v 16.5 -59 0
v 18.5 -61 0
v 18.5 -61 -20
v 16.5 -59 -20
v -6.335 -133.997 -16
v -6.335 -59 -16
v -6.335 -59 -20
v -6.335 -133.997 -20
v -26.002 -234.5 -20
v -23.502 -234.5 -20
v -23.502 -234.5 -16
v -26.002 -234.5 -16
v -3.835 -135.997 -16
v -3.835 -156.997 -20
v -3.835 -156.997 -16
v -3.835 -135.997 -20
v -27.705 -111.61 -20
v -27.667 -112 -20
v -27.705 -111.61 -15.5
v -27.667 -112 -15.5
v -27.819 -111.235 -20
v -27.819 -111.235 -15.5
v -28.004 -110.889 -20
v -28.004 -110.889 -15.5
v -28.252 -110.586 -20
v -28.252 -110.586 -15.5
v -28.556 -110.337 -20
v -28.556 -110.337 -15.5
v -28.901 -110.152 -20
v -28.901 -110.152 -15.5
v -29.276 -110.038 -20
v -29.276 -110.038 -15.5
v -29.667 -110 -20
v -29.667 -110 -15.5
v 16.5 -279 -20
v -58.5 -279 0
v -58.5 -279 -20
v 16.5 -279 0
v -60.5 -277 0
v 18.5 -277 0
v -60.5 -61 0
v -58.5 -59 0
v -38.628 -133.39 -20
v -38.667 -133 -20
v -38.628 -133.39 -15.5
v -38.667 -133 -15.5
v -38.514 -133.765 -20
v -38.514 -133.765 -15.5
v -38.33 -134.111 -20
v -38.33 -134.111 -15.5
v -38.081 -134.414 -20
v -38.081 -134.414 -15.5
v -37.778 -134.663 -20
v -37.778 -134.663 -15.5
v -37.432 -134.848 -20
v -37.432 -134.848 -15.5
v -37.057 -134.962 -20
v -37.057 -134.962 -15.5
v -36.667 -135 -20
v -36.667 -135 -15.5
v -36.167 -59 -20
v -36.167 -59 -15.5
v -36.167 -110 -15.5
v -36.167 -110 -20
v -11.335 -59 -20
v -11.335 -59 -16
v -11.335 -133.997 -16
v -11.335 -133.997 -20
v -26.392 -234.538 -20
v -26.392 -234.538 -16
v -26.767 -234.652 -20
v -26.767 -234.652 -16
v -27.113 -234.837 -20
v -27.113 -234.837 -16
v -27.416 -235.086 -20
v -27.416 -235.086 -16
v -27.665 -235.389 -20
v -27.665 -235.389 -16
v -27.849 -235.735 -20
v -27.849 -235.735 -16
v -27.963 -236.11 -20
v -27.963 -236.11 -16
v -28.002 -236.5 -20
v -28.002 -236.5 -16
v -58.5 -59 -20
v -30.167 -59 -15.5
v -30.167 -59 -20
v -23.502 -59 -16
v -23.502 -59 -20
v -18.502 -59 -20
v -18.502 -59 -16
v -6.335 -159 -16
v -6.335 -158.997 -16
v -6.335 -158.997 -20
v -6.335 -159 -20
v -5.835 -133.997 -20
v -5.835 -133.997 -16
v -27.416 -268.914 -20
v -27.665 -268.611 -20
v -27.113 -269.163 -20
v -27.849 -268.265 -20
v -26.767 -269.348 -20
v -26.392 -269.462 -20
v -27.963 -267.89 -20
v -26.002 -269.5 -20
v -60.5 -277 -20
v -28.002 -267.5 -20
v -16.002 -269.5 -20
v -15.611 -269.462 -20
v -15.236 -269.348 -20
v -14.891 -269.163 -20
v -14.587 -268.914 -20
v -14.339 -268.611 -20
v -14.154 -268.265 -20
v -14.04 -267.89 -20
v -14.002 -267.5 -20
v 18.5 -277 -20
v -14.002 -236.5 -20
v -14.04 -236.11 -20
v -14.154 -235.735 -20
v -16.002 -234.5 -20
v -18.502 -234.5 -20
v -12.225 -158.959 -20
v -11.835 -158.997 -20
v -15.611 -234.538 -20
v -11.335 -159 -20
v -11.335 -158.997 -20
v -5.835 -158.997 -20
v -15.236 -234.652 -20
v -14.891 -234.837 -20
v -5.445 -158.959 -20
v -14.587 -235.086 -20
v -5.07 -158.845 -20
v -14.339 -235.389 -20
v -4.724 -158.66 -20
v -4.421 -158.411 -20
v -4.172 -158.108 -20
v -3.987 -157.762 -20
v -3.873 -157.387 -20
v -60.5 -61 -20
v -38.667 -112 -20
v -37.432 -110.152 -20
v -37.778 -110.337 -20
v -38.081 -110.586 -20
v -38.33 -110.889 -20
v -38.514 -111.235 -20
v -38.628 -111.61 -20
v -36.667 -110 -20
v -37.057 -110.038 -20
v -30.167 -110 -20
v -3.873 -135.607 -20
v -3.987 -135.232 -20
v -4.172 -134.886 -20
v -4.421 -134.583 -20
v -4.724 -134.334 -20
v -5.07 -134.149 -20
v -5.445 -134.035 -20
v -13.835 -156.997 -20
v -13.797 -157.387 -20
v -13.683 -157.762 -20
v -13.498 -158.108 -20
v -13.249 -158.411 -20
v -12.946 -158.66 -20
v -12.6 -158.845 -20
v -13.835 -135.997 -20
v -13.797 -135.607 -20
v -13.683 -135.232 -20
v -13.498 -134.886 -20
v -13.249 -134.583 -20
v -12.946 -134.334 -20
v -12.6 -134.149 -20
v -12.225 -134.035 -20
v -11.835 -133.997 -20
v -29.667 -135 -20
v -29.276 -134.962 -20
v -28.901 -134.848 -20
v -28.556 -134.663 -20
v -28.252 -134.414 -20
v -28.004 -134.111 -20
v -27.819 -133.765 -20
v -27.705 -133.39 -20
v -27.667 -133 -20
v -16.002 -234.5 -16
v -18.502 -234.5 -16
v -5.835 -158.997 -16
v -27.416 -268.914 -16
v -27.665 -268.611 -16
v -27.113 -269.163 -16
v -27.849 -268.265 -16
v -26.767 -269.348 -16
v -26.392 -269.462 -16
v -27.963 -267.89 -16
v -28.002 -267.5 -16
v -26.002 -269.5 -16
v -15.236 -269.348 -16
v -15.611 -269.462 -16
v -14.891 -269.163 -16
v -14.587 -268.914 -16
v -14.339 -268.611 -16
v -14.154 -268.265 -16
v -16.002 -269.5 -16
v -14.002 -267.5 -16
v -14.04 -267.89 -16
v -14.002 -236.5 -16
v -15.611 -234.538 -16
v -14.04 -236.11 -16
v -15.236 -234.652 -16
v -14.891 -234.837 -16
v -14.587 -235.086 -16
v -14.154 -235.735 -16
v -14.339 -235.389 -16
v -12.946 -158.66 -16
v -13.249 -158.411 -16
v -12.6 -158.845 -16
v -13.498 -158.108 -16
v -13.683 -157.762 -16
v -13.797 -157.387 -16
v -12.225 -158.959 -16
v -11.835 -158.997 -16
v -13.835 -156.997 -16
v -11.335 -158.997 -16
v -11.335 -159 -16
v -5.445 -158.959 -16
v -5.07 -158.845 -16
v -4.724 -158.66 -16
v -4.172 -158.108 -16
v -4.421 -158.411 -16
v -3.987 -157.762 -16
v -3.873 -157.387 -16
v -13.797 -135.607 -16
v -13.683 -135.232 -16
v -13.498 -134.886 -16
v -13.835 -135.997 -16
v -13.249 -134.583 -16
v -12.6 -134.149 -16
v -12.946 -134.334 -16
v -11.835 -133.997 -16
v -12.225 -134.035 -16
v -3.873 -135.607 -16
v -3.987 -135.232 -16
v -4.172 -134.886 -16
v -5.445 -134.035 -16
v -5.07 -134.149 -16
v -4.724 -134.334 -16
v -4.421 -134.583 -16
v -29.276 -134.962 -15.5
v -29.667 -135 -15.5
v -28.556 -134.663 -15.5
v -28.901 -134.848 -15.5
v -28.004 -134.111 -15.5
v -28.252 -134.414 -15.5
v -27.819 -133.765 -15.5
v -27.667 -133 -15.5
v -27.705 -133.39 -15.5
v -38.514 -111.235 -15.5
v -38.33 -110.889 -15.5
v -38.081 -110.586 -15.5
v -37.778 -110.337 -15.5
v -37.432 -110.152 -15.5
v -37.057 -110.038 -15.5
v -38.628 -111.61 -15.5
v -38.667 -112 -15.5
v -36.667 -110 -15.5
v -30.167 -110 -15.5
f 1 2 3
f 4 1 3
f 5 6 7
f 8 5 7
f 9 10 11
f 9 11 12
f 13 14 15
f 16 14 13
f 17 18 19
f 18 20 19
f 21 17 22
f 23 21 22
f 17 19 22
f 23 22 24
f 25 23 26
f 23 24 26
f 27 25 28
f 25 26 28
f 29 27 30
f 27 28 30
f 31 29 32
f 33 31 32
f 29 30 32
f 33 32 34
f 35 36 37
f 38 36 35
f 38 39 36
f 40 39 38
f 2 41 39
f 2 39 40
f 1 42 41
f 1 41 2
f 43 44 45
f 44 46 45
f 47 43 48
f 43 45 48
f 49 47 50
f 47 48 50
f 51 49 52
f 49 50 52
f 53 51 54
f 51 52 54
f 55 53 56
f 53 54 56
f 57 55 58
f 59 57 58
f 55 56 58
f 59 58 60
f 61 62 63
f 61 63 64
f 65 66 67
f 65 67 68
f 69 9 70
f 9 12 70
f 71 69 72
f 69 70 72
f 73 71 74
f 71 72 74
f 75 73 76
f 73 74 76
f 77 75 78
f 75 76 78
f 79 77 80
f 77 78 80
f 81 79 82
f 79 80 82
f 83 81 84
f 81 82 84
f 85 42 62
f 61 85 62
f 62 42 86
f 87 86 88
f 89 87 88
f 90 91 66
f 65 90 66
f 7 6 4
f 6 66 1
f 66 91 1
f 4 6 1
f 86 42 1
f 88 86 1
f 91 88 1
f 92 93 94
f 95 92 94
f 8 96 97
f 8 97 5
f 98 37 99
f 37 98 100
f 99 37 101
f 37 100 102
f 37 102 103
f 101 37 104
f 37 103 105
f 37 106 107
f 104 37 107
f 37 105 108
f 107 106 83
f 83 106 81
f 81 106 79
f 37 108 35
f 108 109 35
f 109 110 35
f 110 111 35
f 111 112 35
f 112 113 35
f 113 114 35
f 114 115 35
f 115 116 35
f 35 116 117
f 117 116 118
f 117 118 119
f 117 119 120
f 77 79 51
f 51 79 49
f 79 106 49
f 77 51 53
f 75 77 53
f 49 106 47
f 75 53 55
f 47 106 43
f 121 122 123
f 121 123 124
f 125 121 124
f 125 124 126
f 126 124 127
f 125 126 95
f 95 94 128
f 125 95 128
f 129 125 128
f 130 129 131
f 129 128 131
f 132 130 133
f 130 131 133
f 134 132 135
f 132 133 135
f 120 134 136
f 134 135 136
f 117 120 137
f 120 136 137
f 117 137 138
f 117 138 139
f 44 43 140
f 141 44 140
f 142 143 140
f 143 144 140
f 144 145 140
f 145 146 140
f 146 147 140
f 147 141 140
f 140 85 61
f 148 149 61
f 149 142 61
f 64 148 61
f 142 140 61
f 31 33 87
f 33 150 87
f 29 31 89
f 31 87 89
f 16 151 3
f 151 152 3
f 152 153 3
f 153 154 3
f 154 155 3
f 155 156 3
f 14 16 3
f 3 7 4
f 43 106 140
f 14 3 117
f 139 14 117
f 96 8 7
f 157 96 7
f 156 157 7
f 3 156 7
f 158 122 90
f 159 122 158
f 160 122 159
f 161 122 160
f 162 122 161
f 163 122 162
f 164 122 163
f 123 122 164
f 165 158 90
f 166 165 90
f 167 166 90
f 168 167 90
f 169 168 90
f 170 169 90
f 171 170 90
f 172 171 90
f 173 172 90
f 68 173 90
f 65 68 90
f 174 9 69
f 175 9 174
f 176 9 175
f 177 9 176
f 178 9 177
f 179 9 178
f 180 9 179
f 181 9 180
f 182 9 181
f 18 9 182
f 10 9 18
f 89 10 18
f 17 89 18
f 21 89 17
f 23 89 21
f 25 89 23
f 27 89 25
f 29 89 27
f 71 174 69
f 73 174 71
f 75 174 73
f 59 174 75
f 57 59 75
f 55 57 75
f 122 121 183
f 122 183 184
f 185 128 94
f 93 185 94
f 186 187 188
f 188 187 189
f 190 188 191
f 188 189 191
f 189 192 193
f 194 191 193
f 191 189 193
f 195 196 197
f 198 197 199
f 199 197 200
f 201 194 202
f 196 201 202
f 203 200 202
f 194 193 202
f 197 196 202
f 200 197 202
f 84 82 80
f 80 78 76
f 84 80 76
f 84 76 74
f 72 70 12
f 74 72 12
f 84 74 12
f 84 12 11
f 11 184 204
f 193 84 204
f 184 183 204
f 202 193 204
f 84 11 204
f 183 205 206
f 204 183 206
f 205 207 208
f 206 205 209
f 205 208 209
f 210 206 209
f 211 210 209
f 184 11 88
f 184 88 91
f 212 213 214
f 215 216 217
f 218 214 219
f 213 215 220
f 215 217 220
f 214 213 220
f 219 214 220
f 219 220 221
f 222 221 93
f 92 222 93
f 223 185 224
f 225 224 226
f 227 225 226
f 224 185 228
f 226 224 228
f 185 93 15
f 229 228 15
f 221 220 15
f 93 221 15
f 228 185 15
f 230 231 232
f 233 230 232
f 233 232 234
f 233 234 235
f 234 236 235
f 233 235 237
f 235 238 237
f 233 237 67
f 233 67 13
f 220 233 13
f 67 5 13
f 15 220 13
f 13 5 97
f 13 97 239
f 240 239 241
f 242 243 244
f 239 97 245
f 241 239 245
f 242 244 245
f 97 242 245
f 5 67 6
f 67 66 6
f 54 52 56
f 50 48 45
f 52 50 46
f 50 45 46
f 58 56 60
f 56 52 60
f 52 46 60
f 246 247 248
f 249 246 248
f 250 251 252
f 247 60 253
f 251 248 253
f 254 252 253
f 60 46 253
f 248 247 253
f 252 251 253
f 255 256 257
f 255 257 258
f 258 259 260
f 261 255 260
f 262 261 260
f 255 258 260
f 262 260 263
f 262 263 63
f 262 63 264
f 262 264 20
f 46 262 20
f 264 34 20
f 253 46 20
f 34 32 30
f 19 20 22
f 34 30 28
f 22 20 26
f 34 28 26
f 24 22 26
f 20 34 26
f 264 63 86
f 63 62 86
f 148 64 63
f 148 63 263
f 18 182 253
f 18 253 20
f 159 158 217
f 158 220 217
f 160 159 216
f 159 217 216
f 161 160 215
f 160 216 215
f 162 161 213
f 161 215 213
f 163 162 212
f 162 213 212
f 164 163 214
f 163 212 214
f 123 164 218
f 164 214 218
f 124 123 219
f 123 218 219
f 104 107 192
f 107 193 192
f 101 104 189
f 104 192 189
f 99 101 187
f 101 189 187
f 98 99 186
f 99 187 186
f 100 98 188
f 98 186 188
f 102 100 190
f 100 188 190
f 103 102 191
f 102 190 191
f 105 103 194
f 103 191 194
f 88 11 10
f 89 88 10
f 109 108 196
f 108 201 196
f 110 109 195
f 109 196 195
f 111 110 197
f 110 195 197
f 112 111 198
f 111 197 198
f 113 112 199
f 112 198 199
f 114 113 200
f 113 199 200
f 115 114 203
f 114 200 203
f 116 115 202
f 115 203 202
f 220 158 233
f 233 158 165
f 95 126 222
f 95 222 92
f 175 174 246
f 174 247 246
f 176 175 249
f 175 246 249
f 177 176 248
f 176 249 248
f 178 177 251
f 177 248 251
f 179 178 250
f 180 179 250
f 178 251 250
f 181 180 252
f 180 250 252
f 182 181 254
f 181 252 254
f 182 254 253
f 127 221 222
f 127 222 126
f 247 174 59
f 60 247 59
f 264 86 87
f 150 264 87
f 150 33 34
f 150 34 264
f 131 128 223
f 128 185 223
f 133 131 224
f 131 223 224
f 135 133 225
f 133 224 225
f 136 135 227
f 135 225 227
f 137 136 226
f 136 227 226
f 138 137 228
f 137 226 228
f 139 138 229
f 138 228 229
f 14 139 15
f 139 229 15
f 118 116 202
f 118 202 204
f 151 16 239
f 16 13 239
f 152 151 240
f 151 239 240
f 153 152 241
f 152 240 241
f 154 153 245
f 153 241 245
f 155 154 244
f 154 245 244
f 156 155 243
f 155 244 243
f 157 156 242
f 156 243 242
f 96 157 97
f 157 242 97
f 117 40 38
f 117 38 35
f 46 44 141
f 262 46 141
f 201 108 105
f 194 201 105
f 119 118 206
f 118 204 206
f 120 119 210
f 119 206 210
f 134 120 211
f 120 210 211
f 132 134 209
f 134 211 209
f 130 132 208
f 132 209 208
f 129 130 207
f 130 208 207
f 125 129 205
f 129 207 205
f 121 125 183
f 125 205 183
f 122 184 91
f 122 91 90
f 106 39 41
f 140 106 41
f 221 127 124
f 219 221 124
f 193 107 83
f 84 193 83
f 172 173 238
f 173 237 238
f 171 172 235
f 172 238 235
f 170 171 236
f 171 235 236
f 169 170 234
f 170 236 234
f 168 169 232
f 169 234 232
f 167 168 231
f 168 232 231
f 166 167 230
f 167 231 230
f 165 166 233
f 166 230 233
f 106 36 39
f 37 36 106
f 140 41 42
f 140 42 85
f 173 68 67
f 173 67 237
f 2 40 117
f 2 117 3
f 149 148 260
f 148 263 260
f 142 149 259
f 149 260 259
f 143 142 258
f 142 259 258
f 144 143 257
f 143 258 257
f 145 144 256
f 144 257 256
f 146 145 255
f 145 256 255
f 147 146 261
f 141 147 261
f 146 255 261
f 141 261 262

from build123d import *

# Parameters (mm, degrees)
SKETCH1_W           = 79
SKETCH1_H           = 220
BOSS_EXTRUDE1_DEPTH = 20
SKETCH2_W           = 6
SKETCH2_H           = 6
CUT_EXTRUDE1_DEPTH  = 76
SKETCH3_W           = 5
SKETCH3_H           = 5
CUT_EXTRUDE2_DEPTH  = 189
SKETCH4_W           = 5
SKETCH4_H           = 5
CUT_EXTRUDE3_DEPTH  = 100
SKETCH5_W           = 10
SKETCH5_H           = 25
CUT_EXTRUDE4_DEPTH  = 4
FILLET1_R           = 2
SKETCH6_W           = 11
SKETCH6_H           = 25
CUT_EXTRUDE5_DEPTH  = 4.5
FILLET2_R           = 2
SKETCH7_W           = 14
SKETCH7_H           = 35
CUT_EXTRUDE6_DEPTH  = 4
FILLET3_R           = 2
CHAMFER1_SIZE       = 2


with BuildPart() as part:
    # Sketch1 → Boss-Extrude1 (new body)
    with BuildSketch(Plane.XY):
        with Locations((-21, -169)):
            Rectangle(SKETCH1_W, SKETCH1_H)
    extrude(amount=-BOSS_EXTRUDE1_DEPTH)

    # Sketch2 → Cut-Extrude1 (cut)
    with BuildSketch(Plane(origin=(0, -59, 0), x_dir=(1, 0, 0), z_dir=(0, 1, 0))):
        with Locations((-33.166666667, 18.5)):
            Rectangle(SKETCH2_W, SKETCH2_H)
    extrude(amount=-CUT_EXTRUDE1_DEPTH, mode=Mode.SUBTRACT)

    # Sketch3 → Cut-Extrude2 (cut)
    with BuildSketch(Plane(origin=(0, -59, 0), x_dir=(1, 0, 0), z_dir=(0, 1, 0))):
        with Locations((-21.001666667, 18.5)):
            Rectangle(SKETCH3_W, SKETCH3_H)
    extrude(amount=-CUT_EXTRUDE2_DEPTH, mode=Mode.SUBTRACT)

    # Sketch4 → Cut-Extrude3 (cut)
    with BuildSketch(Plane(origin=(0, -59, 0), x_dir=(1, 0, 0), z_dir=(0, 1, 0))):
        with Locations((-8.835, 18.5)):
            Rectangle(SKETCH4_W, SKETCH4_H)
    extrude(amount=-CUT_EXTRUDE3_DEPTH, mode=Mode.SUBTRACT)

    # Sketch5 → Cut-Extrude4 (cut)
    with BuildSketch(Plane(origin=(0, 0, -20), x_dir=(-1, 0, 0), z_dir=(0, 0, -1))):
        with Locations((8.835, -146.496976588)):
            Rectangle(SKETCH5_W, SKETCH5_H)
    extrude(amount=-CUT_EXTRUDE4_DEPTH, mode=Mode.SUBTRACT)

    # Fillet1
    fillet1_edges = [part.edges().sort_by_distance(p)[0] for p in [
        (-13.835, -158.996976588, -18),
        (-3.835, -133.996976588, -18),
        (-13.835, -133.996976588, -18),
        (-3.835, -158.996976588, -18),
    ]]
    fillet(fillet1_edges, radius=FILLET1_R)

    # Sketch6 → Cut-Extrude5 (cut)
    with BuildSketch(Plane(origin=(0, 0, -20), x_dir=(-1, 0, 0), z_dir=(0, 0, -1))):
        with Locations((33.166666667, -122.5)):
            Rectangle(SKETCH6_W, SKETCH6_H)
    extrude(amount=-CUT_EXTRUDE5_DEPTH, mode=Mode.SUBTRACT)

    # Fillet2
    fillet2_edges = [part.edges().sort_by_distance(p)[0] for p in [
        (-38.666666667, -135, -17.75),
        (-27.666666667, -110, -17.75),
        (-38.666666667, -110, -17.75),
        (-27.666666667, -135, -17.75),
    ]]
    fillet(fillet2_edges, radius=FILLET2_R)

    # Sketch7 → Cut-Extrude6 (cut)
    with BuildSketch(Plane(origin=(0, 0, -20), x_dir=(-1, 0, 0), z_dir=(0, 0, -1))):
        with Locations((21.001666667, -252)):
            Rectangle(SKETCH7_W, SKETCH7_H)
    extrude(amount=-CUT_EXTRUDE6_DEPTH, mode=Mode.SUBTRACT)

    # Fillet3
    fillet3_edges = [part.edges().sort_by_distance(p)[0] for p in [
        (-14.001666667, -234.5, -18),
        (-14.001666667, -269.5, -18),
        (-28.001666667, -269.5, -18),
        (-28.001666667, -234.5, -18),
    ]]
    fillet(fillet3_edges, radius=FILLET3_R)

    # Chamfer1
    chamfer1_edges = [part.edges().sort_by_distance(p)[0] for p in [
        (18.5, -279, -10),
        (-60.5, -279, -10),
        (-60.5, -59, -10),
        (18.5, -59, -10),
    ]]
    chamfer(chamfer1_edges, length=CHAMFER1_SIZE)


solid = part.part
